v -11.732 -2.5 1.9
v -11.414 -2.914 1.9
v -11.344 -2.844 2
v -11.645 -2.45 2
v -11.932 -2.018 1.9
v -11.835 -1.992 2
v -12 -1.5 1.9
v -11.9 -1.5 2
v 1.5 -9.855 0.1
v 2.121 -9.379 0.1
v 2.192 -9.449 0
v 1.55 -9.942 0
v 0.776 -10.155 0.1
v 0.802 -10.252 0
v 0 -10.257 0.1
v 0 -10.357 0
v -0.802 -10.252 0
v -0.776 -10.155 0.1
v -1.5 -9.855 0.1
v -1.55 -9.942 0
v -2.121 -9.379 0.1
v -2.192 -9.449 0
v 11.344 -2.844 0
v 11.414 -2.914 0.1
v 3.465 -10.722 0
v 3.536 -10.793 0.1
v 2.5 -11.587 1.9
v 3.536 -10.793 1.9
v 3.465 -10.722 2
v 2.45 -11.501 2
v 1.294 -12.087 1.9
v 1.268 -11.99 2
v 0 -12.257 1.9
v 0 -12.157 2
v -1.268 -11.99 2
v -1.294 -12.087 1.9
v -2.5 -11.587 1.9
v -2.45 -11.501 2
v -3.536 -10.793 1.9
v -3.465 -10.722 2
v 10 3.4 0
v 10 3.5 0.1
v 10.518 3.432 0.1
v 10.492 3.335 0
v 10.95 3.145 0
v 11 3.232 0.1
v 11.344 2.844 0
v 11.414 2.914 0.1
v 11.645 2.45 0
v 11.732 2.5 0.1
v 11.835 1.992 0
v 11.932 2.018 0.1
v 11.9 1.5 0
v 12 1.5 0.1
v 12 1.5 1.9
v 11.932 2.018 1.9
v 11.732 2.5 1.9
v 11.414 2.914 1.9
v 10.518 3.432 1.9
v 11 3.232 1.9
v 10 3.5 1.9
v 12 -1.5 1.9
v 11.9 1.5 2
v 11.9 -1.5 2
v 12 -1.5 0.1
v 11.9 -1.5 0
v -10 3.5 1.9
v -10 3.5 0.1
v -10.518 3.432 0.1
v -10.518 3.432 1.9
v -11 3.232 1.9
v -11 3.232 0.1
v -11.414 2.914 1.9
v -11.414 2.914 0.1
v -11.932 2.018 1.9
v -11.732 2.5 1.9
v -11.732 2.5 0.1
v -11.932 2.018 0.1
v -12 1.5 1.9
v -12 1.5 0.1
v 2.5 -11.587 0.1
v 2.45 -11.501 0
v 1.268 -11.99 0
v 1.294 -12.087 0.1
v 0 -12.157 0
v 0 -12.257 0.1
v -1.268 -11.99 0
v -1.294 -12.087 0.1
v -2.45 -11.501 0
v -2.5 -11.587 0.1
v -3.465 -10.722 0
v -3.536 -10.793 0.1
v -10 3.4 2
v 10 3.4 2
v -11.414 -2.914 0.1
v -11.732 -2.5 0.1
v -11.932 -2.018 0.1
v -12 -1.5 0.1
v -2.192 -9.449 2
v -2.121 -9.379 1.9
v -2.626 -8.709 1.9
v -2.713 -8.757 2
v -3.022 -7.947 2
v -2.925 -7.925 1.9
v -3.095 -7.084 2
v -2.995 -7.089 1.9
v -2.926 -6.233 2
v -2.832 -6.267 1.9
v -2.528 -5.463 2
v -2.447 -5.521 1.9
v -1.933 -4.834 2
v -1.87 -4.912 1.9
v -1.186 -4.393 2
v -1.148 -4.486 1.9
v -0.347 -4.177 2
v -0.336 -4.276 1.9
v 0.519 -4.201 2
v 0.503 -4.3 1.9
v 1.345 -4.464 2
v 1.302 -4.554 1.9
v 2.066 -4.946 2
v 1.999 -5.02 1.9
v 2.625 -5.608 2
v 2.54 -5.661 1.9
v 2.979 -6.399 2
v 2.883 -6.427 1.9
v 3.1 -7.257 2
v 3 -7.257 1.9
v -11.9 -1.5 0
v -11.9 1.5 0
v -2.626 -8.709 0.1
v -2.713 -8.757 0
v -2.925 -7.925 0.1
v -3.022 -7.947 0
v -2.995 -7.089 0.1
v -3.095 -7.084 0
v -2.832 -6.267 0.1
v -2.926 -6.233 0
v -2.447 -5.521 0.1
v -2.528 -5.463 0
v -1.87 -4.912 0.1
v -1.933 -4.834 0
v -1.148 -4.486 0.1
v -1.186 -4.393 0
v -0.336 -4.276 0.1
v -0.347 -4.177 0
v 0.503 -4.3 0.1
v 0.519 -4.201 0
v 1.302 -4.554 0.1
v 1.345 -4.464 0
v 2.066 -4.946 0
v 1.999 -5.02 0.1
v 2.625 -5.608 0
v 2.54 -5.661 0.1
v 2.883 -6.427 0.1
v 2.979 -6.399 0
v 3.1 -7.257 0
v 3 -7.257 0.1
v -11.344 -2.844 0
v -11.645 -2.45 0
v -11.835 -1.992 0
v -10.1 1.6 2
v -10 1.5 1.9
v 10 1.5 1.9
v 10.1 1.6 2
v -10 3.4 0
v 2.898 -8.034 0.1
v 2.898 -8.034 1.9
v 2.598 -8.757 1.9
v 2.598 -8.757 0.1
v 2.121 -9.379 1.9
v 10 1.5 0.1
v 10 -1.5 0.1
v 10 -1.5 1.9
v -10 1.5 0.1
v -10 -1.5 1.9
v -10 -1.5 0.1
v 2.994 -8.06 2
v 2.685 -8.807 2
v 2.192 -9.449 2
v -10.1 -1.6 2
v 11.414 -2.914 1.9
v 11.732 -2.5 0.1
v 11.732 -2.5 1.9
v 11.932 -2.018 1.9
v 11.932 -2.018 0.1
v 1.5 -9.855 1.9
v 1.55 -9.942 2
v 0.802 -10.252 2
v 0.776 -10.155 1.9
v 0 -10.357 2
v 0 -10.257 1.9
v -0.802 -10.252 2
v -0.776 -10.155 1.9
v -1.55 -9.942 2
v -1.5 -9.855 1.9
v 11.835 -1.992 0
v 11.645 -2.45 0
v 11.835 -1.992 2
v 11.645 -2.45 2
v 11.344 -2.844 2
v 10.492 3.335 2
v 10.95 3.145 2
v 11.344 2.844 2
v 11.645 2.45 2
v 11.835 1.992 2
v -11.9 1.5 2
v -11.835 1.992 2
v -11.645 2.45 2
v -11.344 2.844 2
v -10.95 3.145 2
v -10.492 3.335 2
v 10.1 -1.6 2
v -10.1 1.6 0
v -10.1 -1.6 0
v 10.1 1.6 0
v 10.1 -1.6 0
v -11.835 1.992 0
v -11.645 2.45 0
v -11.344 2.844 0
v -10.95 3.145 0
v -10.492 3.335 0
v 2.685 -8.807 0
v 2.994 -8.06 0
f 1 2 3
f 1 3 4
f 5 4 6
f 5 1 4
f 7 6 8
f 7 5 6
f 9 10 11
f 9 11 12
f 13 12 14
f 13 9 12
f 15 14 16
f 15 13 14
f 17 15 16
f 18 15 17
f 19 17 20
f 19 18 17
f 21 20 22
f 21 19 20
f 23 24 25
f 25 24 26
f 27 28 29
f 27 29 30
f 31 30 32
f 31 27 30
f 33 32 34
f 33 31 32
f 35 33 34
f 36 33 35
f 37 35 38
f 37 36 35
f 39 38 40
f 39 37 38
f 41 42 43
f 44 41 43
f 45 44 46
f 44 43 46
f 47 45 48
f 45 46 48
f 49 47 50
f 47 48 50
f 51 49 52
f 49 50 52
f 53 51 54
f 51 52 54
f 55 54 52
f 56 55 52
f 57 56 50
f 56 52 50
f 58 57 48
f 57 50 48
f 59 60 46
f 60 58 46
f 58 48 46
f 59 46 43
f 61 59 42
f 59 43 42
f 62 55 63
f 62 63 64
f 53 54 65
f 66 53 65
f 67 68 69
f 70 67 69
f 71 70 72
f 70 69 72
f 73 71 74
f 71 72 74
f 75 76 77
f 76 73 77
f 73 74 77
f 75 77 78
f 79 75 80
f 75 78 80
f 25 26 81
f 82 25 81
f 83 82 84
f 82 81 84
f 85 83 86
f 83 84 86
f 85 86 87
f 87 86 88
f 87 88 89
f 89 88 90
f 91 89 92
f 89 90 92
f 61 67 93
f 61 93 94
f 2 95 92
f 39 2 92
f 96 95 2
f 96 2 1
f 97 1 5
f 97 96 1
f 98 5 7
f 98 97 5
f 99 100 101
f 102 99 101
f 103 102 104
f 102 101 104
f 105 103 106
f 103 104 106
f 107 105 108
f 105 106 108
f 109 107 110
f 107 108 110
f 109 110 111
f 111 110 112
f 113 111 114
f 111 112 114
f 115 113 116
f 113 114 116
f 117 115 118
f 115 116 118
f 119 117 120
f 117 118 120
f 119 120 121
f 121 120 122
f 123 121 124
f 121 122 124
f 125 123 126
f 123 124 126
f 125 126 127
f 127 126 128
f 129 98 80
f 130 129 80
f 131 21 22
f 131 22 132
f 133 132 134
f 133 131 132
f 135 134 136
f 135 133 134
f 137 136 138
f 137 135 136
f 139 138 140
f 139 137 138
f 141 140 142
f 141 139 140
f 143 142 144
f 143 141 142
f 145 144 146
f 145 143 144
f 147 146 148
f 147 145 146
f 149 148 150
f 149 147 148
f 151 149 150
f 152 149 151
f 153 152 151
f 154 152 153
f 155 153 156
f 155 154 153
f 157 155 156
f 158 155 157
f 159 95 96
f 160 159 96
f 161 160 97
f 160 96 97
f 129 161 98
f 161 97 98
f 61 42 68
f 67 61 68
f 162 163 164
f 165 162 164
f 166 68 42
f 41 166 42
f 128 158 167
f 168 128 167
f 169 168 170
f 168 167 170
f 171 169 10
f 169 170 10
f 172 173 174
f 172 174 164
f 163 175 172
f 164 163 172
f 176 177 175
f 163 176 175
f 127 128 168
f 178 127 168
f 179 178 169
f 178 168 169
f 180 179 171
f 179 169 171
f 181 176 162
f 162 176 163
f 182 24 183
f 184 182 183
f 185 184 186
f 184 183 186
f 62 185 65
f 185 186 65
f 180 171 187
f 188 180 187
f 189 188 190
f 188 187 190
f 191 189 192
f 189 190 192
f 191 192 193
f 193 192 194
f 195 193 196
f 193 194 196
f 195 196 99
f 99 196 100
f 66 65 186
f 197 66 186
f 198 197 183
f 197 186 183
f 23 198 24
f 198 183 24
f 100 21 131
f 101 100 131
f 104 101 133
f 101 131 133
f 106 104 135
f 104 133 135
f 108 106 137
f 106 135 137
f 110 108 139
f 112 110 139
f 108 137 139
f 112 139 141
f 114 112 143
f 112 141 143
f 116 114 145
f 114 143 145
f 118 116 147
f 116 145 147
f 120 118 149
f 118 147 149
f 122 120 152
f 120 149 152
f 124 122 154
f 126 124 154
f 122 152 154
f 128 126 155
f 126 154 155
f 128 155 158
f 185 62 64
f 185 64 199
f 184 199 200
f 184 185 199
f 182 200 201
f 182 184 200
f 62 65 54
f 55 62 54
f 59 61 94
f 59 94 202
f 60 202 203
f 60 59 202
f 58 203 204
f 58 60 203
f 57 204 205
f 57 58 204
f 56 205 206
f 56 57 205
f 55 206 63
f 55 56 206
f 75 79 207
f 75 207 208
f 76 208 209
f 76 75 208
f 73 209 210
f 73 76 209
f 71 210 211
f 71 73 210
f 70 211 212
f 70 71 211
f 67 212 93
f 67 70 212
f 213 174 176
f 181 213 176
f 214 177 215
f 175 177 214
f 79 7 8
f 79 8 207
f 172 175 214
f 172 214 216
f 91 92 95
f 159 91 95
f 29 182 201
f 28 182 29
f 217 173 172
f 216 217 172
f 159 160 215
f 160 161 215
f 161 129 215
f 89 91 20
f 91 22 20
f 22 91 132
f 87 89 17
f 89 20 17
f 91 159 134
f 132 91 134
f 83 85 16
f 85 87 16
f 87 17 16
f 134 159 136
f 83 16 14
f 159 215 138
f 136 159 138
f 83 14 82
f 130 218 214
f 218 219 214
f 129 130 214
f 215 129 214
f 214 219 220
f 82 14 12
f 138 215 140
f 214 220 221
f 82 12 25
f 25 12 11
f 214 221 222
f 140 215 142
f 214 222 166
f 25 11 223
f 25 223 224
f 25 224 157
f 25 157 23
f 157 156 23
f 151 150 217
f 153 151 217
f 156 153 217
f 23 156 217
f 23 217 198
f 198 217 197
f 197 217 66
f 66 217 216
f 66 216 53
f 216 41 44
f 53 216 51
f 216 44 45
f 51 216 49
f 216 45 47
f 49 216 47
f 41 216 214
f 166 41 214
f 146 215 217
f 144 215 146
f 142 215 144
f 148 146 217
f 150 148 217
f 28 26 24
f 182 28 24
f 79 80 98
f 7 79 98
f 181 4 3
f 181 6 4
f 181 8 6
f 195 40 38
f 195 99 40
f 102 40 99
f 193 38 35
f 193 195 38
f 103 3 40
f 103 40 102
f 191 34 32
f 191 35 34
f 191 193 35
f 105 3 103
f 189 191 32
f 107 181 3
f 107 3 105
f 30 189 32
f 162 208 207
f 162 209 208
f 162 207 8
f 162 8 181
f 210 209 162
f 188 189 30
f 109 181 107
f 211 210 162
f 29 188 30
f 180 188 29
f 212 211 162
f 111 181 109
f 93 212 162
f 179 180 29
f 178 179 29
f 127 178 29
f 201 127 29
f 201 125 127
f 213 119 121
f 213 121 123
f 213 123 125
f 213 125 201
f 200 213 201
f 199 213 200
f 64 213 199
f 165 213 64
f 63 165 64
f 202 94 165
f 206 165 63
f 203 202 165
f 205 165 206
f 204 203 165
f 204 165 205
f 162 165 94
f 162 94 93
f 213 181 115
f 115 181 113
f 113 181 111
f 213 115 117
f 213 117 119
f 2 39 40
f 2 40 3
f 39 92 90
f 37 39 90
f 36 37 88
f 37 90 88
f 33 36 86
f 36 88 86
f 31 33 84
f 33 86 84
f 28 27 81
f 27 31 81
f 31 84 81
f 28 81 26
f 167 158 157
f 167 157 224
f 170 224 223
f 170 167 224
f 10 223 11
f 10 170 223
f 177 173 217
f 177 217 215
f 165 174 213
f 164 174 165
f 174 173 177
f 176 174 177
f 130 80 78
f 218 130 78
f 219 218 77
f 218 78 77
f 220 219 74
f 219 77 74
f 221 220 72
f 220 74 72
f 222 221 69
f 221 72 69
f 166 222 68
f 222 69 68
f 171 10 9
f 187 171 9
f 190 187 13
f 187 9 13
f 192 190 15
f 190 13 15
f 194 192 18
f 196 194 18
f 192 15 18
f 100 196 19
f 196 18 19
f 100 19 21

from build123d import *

# Parameters (mm, degrees)
F0_W        = 2
F0_H        = 2
F0_W_2      = 20
F0_H_2      = 3
F1_DEPTH    = 2
F2_T1_DEPTH = 12
F2_T3_DEPTH = 6.1421356237
F3_SIZE     = 0.1


# Not quite as in the source:
# - a fillet or chamfer that OpenCascade refuses, or shapes differently, is made with other operations: its cross-section is extruded or revolved along the edge and cut away or added


with BuildPart() as f1:
    # F0 (on Top) → F1 (new body)
    with BuildSketch(Plane.XY):
        with Locations((-11, 2.5)):
            Rectangle(F0_W, F0_H)
        with Locations((0, 2.5)):
            Rectangle(F0_W_2, F0_H)
        with Locations((11, 2.5)):
            Rectangle(F0_W, F0_H)
        with Locations((11, 0)):
            Rectangle(F0_W, F0_H_2)
        Polygon((12, -1.5), (10, -1.5), (11.4142135624, -2.9142135624), (12, -2.3284271247), align=None)
        Polygon((11.4142135624, -2.9142135624), (10, -1.5), (2.1213203436, -9.3786796564), (3.5355339059, -10.7928932188), align=None)
        with BuildLine():
            ThreePointArc((2.1213203436, -9.3786796564), (0, -10.2573593129), (-2.1213203436, -9.3786796564))
            Line((-2.1213203436, -9.3786796564), (-3.5355339059, -10.7928932188))
            ThreePointArc((-3.5355339059, -10.7928932188), (0, -12.2573593129), (3.5355339059, -10.7928932188))
            Line((3.5355339059, -10.7928932188), (2.1213203436, -9.3786796564))
        make_face()
        Polygon((-2.1213203436, -9.3786796564), (-10, -1.5), (-11.4142135624, -2.9142135624), (-3.5355339059, -10.7928932188), align=None)
        Polygon((-11.4142135624, -2.9142135624), (-10, -1.5), (-12, -1.5), (-12, -2.3284271247), align=None)
        with Locations((-11, 0)):
            Rectangle(F0_W, F0_H_2)
        with BuildLine():
            Line((0, -1.5), (-10, -1.5))
            Line((-10, -1.5), (-2.1213203436, -9.3786796564))
            ThreePointArc((-2.1213203436, -9.3786796564), (-1.1480502971, -4.4857207153), (3, -7.2573593129))
            ThreePointArc((3, -7.2573593129), (2.7716385975, -8.40540961), (2.1213203436, -9.3786796564))
            Line((2.1213203436, -9.3786796564), (10, -1.5))
            Line((10, -1.5), (0, -1.5))
        make_face()
    extrude(amount=F1_DEPTH)

    # F2: fillet of radius 2 on 4 edges, made by hand

    # F2_s2 → F2_t1 (cut)
    with BuildSketch(Plane.XY.offset(-5)):
        with BuildLine():
            ThreePointArc((-10, 3.5), (-11.4142135624, 2.9142135624), (-12, 1.5))
            Line((-12, 1.5), (-12, 3.5))
            Line((-12, 3.5), (-10, 3.5))
        make_face()
        with BuildLine():
            ThreePointArc((12, 1.5), (11.4142135624, 2.9142135624), (10, 3.5))
            Line((10, 3.5), (12, 3.5))
            Line((12, 3.5), (12, 1.5))
        make_face()
    extrude(amount=F2_T1_DEPTH, mode=Mode.SUBTRACT)

    # F2_s4 → F2_t3 (cut)
    with BuildSketch(Plane.XY.offset(-2.0710678119)):
        with BuildLine():
            ThreePointArc((-11.4142135624, -2.9142135624), (-11.847759065, -2.2653668647), (-12, -1.5))
            Line((-12, -1.5), (-12, -2.3284271247))
            Line((-12, -2.3284271247), (-11.4142135624, -2.9142135624))
        make_face()
        with BuildLine():
            ThreePointArc((11.4142135624, -2.9142135624), (11.847759065, -2.2653668647), (12, -1.5))
            Line((12, -1.5), (12, -2.3284271247))
            Line((12, -2.3284271247), (11.4142135624, -2.9142135624))
        make_face()
    extrude(amount=F2_T3_DEPTH, mode=Mode.SUBTRACT)

    # F3
    f3_edges = [f1.edges().sort_by_distance(p)[0] for p in [
        (-11.414214, 2.914214, 2),
        (0, 3.5, 2),
        (11.414214, 2.914214, 2),
        (12, 0, 2),
        (11.847759, -2.265367, 2),
        (7.474874, -6.853553, 2),
        (0, -12.257359, 2),
        (-7.474874, -6.853553, 2),
        (-11.847759, -2.265367, 2),
        (-12, 0, 2),
        (2.12132, -5.136039, 2),
        (0, 1.5, 2),
        (-10, 0, 2),
        (10, 0, 2),
        (0, -1.5, 2),
        (-11.414214, 2.914214, 0),
        (0, 3.5, 0),
        (11.414214, 2.914214, 0),
        (12, 0, 0),
        (11.847759, -2.265367, 0),
        (7.474874, -6.853553, 0),
        (0, -12.257359, 0),
        (-7.474874, -6.853553, 0),
        (-11.847759, -2.265367, 0),
        (-12, 0, 0),
        (2.12132, -5.136039, 0),
        (0, 1.5, 0),
        (-10, 0, 0),
        (10, 0, 0),
        (0, -1.5, 0),
    ]]
    chamfer(f3_edges, length=F3_SIZE)


solid = f1.part
